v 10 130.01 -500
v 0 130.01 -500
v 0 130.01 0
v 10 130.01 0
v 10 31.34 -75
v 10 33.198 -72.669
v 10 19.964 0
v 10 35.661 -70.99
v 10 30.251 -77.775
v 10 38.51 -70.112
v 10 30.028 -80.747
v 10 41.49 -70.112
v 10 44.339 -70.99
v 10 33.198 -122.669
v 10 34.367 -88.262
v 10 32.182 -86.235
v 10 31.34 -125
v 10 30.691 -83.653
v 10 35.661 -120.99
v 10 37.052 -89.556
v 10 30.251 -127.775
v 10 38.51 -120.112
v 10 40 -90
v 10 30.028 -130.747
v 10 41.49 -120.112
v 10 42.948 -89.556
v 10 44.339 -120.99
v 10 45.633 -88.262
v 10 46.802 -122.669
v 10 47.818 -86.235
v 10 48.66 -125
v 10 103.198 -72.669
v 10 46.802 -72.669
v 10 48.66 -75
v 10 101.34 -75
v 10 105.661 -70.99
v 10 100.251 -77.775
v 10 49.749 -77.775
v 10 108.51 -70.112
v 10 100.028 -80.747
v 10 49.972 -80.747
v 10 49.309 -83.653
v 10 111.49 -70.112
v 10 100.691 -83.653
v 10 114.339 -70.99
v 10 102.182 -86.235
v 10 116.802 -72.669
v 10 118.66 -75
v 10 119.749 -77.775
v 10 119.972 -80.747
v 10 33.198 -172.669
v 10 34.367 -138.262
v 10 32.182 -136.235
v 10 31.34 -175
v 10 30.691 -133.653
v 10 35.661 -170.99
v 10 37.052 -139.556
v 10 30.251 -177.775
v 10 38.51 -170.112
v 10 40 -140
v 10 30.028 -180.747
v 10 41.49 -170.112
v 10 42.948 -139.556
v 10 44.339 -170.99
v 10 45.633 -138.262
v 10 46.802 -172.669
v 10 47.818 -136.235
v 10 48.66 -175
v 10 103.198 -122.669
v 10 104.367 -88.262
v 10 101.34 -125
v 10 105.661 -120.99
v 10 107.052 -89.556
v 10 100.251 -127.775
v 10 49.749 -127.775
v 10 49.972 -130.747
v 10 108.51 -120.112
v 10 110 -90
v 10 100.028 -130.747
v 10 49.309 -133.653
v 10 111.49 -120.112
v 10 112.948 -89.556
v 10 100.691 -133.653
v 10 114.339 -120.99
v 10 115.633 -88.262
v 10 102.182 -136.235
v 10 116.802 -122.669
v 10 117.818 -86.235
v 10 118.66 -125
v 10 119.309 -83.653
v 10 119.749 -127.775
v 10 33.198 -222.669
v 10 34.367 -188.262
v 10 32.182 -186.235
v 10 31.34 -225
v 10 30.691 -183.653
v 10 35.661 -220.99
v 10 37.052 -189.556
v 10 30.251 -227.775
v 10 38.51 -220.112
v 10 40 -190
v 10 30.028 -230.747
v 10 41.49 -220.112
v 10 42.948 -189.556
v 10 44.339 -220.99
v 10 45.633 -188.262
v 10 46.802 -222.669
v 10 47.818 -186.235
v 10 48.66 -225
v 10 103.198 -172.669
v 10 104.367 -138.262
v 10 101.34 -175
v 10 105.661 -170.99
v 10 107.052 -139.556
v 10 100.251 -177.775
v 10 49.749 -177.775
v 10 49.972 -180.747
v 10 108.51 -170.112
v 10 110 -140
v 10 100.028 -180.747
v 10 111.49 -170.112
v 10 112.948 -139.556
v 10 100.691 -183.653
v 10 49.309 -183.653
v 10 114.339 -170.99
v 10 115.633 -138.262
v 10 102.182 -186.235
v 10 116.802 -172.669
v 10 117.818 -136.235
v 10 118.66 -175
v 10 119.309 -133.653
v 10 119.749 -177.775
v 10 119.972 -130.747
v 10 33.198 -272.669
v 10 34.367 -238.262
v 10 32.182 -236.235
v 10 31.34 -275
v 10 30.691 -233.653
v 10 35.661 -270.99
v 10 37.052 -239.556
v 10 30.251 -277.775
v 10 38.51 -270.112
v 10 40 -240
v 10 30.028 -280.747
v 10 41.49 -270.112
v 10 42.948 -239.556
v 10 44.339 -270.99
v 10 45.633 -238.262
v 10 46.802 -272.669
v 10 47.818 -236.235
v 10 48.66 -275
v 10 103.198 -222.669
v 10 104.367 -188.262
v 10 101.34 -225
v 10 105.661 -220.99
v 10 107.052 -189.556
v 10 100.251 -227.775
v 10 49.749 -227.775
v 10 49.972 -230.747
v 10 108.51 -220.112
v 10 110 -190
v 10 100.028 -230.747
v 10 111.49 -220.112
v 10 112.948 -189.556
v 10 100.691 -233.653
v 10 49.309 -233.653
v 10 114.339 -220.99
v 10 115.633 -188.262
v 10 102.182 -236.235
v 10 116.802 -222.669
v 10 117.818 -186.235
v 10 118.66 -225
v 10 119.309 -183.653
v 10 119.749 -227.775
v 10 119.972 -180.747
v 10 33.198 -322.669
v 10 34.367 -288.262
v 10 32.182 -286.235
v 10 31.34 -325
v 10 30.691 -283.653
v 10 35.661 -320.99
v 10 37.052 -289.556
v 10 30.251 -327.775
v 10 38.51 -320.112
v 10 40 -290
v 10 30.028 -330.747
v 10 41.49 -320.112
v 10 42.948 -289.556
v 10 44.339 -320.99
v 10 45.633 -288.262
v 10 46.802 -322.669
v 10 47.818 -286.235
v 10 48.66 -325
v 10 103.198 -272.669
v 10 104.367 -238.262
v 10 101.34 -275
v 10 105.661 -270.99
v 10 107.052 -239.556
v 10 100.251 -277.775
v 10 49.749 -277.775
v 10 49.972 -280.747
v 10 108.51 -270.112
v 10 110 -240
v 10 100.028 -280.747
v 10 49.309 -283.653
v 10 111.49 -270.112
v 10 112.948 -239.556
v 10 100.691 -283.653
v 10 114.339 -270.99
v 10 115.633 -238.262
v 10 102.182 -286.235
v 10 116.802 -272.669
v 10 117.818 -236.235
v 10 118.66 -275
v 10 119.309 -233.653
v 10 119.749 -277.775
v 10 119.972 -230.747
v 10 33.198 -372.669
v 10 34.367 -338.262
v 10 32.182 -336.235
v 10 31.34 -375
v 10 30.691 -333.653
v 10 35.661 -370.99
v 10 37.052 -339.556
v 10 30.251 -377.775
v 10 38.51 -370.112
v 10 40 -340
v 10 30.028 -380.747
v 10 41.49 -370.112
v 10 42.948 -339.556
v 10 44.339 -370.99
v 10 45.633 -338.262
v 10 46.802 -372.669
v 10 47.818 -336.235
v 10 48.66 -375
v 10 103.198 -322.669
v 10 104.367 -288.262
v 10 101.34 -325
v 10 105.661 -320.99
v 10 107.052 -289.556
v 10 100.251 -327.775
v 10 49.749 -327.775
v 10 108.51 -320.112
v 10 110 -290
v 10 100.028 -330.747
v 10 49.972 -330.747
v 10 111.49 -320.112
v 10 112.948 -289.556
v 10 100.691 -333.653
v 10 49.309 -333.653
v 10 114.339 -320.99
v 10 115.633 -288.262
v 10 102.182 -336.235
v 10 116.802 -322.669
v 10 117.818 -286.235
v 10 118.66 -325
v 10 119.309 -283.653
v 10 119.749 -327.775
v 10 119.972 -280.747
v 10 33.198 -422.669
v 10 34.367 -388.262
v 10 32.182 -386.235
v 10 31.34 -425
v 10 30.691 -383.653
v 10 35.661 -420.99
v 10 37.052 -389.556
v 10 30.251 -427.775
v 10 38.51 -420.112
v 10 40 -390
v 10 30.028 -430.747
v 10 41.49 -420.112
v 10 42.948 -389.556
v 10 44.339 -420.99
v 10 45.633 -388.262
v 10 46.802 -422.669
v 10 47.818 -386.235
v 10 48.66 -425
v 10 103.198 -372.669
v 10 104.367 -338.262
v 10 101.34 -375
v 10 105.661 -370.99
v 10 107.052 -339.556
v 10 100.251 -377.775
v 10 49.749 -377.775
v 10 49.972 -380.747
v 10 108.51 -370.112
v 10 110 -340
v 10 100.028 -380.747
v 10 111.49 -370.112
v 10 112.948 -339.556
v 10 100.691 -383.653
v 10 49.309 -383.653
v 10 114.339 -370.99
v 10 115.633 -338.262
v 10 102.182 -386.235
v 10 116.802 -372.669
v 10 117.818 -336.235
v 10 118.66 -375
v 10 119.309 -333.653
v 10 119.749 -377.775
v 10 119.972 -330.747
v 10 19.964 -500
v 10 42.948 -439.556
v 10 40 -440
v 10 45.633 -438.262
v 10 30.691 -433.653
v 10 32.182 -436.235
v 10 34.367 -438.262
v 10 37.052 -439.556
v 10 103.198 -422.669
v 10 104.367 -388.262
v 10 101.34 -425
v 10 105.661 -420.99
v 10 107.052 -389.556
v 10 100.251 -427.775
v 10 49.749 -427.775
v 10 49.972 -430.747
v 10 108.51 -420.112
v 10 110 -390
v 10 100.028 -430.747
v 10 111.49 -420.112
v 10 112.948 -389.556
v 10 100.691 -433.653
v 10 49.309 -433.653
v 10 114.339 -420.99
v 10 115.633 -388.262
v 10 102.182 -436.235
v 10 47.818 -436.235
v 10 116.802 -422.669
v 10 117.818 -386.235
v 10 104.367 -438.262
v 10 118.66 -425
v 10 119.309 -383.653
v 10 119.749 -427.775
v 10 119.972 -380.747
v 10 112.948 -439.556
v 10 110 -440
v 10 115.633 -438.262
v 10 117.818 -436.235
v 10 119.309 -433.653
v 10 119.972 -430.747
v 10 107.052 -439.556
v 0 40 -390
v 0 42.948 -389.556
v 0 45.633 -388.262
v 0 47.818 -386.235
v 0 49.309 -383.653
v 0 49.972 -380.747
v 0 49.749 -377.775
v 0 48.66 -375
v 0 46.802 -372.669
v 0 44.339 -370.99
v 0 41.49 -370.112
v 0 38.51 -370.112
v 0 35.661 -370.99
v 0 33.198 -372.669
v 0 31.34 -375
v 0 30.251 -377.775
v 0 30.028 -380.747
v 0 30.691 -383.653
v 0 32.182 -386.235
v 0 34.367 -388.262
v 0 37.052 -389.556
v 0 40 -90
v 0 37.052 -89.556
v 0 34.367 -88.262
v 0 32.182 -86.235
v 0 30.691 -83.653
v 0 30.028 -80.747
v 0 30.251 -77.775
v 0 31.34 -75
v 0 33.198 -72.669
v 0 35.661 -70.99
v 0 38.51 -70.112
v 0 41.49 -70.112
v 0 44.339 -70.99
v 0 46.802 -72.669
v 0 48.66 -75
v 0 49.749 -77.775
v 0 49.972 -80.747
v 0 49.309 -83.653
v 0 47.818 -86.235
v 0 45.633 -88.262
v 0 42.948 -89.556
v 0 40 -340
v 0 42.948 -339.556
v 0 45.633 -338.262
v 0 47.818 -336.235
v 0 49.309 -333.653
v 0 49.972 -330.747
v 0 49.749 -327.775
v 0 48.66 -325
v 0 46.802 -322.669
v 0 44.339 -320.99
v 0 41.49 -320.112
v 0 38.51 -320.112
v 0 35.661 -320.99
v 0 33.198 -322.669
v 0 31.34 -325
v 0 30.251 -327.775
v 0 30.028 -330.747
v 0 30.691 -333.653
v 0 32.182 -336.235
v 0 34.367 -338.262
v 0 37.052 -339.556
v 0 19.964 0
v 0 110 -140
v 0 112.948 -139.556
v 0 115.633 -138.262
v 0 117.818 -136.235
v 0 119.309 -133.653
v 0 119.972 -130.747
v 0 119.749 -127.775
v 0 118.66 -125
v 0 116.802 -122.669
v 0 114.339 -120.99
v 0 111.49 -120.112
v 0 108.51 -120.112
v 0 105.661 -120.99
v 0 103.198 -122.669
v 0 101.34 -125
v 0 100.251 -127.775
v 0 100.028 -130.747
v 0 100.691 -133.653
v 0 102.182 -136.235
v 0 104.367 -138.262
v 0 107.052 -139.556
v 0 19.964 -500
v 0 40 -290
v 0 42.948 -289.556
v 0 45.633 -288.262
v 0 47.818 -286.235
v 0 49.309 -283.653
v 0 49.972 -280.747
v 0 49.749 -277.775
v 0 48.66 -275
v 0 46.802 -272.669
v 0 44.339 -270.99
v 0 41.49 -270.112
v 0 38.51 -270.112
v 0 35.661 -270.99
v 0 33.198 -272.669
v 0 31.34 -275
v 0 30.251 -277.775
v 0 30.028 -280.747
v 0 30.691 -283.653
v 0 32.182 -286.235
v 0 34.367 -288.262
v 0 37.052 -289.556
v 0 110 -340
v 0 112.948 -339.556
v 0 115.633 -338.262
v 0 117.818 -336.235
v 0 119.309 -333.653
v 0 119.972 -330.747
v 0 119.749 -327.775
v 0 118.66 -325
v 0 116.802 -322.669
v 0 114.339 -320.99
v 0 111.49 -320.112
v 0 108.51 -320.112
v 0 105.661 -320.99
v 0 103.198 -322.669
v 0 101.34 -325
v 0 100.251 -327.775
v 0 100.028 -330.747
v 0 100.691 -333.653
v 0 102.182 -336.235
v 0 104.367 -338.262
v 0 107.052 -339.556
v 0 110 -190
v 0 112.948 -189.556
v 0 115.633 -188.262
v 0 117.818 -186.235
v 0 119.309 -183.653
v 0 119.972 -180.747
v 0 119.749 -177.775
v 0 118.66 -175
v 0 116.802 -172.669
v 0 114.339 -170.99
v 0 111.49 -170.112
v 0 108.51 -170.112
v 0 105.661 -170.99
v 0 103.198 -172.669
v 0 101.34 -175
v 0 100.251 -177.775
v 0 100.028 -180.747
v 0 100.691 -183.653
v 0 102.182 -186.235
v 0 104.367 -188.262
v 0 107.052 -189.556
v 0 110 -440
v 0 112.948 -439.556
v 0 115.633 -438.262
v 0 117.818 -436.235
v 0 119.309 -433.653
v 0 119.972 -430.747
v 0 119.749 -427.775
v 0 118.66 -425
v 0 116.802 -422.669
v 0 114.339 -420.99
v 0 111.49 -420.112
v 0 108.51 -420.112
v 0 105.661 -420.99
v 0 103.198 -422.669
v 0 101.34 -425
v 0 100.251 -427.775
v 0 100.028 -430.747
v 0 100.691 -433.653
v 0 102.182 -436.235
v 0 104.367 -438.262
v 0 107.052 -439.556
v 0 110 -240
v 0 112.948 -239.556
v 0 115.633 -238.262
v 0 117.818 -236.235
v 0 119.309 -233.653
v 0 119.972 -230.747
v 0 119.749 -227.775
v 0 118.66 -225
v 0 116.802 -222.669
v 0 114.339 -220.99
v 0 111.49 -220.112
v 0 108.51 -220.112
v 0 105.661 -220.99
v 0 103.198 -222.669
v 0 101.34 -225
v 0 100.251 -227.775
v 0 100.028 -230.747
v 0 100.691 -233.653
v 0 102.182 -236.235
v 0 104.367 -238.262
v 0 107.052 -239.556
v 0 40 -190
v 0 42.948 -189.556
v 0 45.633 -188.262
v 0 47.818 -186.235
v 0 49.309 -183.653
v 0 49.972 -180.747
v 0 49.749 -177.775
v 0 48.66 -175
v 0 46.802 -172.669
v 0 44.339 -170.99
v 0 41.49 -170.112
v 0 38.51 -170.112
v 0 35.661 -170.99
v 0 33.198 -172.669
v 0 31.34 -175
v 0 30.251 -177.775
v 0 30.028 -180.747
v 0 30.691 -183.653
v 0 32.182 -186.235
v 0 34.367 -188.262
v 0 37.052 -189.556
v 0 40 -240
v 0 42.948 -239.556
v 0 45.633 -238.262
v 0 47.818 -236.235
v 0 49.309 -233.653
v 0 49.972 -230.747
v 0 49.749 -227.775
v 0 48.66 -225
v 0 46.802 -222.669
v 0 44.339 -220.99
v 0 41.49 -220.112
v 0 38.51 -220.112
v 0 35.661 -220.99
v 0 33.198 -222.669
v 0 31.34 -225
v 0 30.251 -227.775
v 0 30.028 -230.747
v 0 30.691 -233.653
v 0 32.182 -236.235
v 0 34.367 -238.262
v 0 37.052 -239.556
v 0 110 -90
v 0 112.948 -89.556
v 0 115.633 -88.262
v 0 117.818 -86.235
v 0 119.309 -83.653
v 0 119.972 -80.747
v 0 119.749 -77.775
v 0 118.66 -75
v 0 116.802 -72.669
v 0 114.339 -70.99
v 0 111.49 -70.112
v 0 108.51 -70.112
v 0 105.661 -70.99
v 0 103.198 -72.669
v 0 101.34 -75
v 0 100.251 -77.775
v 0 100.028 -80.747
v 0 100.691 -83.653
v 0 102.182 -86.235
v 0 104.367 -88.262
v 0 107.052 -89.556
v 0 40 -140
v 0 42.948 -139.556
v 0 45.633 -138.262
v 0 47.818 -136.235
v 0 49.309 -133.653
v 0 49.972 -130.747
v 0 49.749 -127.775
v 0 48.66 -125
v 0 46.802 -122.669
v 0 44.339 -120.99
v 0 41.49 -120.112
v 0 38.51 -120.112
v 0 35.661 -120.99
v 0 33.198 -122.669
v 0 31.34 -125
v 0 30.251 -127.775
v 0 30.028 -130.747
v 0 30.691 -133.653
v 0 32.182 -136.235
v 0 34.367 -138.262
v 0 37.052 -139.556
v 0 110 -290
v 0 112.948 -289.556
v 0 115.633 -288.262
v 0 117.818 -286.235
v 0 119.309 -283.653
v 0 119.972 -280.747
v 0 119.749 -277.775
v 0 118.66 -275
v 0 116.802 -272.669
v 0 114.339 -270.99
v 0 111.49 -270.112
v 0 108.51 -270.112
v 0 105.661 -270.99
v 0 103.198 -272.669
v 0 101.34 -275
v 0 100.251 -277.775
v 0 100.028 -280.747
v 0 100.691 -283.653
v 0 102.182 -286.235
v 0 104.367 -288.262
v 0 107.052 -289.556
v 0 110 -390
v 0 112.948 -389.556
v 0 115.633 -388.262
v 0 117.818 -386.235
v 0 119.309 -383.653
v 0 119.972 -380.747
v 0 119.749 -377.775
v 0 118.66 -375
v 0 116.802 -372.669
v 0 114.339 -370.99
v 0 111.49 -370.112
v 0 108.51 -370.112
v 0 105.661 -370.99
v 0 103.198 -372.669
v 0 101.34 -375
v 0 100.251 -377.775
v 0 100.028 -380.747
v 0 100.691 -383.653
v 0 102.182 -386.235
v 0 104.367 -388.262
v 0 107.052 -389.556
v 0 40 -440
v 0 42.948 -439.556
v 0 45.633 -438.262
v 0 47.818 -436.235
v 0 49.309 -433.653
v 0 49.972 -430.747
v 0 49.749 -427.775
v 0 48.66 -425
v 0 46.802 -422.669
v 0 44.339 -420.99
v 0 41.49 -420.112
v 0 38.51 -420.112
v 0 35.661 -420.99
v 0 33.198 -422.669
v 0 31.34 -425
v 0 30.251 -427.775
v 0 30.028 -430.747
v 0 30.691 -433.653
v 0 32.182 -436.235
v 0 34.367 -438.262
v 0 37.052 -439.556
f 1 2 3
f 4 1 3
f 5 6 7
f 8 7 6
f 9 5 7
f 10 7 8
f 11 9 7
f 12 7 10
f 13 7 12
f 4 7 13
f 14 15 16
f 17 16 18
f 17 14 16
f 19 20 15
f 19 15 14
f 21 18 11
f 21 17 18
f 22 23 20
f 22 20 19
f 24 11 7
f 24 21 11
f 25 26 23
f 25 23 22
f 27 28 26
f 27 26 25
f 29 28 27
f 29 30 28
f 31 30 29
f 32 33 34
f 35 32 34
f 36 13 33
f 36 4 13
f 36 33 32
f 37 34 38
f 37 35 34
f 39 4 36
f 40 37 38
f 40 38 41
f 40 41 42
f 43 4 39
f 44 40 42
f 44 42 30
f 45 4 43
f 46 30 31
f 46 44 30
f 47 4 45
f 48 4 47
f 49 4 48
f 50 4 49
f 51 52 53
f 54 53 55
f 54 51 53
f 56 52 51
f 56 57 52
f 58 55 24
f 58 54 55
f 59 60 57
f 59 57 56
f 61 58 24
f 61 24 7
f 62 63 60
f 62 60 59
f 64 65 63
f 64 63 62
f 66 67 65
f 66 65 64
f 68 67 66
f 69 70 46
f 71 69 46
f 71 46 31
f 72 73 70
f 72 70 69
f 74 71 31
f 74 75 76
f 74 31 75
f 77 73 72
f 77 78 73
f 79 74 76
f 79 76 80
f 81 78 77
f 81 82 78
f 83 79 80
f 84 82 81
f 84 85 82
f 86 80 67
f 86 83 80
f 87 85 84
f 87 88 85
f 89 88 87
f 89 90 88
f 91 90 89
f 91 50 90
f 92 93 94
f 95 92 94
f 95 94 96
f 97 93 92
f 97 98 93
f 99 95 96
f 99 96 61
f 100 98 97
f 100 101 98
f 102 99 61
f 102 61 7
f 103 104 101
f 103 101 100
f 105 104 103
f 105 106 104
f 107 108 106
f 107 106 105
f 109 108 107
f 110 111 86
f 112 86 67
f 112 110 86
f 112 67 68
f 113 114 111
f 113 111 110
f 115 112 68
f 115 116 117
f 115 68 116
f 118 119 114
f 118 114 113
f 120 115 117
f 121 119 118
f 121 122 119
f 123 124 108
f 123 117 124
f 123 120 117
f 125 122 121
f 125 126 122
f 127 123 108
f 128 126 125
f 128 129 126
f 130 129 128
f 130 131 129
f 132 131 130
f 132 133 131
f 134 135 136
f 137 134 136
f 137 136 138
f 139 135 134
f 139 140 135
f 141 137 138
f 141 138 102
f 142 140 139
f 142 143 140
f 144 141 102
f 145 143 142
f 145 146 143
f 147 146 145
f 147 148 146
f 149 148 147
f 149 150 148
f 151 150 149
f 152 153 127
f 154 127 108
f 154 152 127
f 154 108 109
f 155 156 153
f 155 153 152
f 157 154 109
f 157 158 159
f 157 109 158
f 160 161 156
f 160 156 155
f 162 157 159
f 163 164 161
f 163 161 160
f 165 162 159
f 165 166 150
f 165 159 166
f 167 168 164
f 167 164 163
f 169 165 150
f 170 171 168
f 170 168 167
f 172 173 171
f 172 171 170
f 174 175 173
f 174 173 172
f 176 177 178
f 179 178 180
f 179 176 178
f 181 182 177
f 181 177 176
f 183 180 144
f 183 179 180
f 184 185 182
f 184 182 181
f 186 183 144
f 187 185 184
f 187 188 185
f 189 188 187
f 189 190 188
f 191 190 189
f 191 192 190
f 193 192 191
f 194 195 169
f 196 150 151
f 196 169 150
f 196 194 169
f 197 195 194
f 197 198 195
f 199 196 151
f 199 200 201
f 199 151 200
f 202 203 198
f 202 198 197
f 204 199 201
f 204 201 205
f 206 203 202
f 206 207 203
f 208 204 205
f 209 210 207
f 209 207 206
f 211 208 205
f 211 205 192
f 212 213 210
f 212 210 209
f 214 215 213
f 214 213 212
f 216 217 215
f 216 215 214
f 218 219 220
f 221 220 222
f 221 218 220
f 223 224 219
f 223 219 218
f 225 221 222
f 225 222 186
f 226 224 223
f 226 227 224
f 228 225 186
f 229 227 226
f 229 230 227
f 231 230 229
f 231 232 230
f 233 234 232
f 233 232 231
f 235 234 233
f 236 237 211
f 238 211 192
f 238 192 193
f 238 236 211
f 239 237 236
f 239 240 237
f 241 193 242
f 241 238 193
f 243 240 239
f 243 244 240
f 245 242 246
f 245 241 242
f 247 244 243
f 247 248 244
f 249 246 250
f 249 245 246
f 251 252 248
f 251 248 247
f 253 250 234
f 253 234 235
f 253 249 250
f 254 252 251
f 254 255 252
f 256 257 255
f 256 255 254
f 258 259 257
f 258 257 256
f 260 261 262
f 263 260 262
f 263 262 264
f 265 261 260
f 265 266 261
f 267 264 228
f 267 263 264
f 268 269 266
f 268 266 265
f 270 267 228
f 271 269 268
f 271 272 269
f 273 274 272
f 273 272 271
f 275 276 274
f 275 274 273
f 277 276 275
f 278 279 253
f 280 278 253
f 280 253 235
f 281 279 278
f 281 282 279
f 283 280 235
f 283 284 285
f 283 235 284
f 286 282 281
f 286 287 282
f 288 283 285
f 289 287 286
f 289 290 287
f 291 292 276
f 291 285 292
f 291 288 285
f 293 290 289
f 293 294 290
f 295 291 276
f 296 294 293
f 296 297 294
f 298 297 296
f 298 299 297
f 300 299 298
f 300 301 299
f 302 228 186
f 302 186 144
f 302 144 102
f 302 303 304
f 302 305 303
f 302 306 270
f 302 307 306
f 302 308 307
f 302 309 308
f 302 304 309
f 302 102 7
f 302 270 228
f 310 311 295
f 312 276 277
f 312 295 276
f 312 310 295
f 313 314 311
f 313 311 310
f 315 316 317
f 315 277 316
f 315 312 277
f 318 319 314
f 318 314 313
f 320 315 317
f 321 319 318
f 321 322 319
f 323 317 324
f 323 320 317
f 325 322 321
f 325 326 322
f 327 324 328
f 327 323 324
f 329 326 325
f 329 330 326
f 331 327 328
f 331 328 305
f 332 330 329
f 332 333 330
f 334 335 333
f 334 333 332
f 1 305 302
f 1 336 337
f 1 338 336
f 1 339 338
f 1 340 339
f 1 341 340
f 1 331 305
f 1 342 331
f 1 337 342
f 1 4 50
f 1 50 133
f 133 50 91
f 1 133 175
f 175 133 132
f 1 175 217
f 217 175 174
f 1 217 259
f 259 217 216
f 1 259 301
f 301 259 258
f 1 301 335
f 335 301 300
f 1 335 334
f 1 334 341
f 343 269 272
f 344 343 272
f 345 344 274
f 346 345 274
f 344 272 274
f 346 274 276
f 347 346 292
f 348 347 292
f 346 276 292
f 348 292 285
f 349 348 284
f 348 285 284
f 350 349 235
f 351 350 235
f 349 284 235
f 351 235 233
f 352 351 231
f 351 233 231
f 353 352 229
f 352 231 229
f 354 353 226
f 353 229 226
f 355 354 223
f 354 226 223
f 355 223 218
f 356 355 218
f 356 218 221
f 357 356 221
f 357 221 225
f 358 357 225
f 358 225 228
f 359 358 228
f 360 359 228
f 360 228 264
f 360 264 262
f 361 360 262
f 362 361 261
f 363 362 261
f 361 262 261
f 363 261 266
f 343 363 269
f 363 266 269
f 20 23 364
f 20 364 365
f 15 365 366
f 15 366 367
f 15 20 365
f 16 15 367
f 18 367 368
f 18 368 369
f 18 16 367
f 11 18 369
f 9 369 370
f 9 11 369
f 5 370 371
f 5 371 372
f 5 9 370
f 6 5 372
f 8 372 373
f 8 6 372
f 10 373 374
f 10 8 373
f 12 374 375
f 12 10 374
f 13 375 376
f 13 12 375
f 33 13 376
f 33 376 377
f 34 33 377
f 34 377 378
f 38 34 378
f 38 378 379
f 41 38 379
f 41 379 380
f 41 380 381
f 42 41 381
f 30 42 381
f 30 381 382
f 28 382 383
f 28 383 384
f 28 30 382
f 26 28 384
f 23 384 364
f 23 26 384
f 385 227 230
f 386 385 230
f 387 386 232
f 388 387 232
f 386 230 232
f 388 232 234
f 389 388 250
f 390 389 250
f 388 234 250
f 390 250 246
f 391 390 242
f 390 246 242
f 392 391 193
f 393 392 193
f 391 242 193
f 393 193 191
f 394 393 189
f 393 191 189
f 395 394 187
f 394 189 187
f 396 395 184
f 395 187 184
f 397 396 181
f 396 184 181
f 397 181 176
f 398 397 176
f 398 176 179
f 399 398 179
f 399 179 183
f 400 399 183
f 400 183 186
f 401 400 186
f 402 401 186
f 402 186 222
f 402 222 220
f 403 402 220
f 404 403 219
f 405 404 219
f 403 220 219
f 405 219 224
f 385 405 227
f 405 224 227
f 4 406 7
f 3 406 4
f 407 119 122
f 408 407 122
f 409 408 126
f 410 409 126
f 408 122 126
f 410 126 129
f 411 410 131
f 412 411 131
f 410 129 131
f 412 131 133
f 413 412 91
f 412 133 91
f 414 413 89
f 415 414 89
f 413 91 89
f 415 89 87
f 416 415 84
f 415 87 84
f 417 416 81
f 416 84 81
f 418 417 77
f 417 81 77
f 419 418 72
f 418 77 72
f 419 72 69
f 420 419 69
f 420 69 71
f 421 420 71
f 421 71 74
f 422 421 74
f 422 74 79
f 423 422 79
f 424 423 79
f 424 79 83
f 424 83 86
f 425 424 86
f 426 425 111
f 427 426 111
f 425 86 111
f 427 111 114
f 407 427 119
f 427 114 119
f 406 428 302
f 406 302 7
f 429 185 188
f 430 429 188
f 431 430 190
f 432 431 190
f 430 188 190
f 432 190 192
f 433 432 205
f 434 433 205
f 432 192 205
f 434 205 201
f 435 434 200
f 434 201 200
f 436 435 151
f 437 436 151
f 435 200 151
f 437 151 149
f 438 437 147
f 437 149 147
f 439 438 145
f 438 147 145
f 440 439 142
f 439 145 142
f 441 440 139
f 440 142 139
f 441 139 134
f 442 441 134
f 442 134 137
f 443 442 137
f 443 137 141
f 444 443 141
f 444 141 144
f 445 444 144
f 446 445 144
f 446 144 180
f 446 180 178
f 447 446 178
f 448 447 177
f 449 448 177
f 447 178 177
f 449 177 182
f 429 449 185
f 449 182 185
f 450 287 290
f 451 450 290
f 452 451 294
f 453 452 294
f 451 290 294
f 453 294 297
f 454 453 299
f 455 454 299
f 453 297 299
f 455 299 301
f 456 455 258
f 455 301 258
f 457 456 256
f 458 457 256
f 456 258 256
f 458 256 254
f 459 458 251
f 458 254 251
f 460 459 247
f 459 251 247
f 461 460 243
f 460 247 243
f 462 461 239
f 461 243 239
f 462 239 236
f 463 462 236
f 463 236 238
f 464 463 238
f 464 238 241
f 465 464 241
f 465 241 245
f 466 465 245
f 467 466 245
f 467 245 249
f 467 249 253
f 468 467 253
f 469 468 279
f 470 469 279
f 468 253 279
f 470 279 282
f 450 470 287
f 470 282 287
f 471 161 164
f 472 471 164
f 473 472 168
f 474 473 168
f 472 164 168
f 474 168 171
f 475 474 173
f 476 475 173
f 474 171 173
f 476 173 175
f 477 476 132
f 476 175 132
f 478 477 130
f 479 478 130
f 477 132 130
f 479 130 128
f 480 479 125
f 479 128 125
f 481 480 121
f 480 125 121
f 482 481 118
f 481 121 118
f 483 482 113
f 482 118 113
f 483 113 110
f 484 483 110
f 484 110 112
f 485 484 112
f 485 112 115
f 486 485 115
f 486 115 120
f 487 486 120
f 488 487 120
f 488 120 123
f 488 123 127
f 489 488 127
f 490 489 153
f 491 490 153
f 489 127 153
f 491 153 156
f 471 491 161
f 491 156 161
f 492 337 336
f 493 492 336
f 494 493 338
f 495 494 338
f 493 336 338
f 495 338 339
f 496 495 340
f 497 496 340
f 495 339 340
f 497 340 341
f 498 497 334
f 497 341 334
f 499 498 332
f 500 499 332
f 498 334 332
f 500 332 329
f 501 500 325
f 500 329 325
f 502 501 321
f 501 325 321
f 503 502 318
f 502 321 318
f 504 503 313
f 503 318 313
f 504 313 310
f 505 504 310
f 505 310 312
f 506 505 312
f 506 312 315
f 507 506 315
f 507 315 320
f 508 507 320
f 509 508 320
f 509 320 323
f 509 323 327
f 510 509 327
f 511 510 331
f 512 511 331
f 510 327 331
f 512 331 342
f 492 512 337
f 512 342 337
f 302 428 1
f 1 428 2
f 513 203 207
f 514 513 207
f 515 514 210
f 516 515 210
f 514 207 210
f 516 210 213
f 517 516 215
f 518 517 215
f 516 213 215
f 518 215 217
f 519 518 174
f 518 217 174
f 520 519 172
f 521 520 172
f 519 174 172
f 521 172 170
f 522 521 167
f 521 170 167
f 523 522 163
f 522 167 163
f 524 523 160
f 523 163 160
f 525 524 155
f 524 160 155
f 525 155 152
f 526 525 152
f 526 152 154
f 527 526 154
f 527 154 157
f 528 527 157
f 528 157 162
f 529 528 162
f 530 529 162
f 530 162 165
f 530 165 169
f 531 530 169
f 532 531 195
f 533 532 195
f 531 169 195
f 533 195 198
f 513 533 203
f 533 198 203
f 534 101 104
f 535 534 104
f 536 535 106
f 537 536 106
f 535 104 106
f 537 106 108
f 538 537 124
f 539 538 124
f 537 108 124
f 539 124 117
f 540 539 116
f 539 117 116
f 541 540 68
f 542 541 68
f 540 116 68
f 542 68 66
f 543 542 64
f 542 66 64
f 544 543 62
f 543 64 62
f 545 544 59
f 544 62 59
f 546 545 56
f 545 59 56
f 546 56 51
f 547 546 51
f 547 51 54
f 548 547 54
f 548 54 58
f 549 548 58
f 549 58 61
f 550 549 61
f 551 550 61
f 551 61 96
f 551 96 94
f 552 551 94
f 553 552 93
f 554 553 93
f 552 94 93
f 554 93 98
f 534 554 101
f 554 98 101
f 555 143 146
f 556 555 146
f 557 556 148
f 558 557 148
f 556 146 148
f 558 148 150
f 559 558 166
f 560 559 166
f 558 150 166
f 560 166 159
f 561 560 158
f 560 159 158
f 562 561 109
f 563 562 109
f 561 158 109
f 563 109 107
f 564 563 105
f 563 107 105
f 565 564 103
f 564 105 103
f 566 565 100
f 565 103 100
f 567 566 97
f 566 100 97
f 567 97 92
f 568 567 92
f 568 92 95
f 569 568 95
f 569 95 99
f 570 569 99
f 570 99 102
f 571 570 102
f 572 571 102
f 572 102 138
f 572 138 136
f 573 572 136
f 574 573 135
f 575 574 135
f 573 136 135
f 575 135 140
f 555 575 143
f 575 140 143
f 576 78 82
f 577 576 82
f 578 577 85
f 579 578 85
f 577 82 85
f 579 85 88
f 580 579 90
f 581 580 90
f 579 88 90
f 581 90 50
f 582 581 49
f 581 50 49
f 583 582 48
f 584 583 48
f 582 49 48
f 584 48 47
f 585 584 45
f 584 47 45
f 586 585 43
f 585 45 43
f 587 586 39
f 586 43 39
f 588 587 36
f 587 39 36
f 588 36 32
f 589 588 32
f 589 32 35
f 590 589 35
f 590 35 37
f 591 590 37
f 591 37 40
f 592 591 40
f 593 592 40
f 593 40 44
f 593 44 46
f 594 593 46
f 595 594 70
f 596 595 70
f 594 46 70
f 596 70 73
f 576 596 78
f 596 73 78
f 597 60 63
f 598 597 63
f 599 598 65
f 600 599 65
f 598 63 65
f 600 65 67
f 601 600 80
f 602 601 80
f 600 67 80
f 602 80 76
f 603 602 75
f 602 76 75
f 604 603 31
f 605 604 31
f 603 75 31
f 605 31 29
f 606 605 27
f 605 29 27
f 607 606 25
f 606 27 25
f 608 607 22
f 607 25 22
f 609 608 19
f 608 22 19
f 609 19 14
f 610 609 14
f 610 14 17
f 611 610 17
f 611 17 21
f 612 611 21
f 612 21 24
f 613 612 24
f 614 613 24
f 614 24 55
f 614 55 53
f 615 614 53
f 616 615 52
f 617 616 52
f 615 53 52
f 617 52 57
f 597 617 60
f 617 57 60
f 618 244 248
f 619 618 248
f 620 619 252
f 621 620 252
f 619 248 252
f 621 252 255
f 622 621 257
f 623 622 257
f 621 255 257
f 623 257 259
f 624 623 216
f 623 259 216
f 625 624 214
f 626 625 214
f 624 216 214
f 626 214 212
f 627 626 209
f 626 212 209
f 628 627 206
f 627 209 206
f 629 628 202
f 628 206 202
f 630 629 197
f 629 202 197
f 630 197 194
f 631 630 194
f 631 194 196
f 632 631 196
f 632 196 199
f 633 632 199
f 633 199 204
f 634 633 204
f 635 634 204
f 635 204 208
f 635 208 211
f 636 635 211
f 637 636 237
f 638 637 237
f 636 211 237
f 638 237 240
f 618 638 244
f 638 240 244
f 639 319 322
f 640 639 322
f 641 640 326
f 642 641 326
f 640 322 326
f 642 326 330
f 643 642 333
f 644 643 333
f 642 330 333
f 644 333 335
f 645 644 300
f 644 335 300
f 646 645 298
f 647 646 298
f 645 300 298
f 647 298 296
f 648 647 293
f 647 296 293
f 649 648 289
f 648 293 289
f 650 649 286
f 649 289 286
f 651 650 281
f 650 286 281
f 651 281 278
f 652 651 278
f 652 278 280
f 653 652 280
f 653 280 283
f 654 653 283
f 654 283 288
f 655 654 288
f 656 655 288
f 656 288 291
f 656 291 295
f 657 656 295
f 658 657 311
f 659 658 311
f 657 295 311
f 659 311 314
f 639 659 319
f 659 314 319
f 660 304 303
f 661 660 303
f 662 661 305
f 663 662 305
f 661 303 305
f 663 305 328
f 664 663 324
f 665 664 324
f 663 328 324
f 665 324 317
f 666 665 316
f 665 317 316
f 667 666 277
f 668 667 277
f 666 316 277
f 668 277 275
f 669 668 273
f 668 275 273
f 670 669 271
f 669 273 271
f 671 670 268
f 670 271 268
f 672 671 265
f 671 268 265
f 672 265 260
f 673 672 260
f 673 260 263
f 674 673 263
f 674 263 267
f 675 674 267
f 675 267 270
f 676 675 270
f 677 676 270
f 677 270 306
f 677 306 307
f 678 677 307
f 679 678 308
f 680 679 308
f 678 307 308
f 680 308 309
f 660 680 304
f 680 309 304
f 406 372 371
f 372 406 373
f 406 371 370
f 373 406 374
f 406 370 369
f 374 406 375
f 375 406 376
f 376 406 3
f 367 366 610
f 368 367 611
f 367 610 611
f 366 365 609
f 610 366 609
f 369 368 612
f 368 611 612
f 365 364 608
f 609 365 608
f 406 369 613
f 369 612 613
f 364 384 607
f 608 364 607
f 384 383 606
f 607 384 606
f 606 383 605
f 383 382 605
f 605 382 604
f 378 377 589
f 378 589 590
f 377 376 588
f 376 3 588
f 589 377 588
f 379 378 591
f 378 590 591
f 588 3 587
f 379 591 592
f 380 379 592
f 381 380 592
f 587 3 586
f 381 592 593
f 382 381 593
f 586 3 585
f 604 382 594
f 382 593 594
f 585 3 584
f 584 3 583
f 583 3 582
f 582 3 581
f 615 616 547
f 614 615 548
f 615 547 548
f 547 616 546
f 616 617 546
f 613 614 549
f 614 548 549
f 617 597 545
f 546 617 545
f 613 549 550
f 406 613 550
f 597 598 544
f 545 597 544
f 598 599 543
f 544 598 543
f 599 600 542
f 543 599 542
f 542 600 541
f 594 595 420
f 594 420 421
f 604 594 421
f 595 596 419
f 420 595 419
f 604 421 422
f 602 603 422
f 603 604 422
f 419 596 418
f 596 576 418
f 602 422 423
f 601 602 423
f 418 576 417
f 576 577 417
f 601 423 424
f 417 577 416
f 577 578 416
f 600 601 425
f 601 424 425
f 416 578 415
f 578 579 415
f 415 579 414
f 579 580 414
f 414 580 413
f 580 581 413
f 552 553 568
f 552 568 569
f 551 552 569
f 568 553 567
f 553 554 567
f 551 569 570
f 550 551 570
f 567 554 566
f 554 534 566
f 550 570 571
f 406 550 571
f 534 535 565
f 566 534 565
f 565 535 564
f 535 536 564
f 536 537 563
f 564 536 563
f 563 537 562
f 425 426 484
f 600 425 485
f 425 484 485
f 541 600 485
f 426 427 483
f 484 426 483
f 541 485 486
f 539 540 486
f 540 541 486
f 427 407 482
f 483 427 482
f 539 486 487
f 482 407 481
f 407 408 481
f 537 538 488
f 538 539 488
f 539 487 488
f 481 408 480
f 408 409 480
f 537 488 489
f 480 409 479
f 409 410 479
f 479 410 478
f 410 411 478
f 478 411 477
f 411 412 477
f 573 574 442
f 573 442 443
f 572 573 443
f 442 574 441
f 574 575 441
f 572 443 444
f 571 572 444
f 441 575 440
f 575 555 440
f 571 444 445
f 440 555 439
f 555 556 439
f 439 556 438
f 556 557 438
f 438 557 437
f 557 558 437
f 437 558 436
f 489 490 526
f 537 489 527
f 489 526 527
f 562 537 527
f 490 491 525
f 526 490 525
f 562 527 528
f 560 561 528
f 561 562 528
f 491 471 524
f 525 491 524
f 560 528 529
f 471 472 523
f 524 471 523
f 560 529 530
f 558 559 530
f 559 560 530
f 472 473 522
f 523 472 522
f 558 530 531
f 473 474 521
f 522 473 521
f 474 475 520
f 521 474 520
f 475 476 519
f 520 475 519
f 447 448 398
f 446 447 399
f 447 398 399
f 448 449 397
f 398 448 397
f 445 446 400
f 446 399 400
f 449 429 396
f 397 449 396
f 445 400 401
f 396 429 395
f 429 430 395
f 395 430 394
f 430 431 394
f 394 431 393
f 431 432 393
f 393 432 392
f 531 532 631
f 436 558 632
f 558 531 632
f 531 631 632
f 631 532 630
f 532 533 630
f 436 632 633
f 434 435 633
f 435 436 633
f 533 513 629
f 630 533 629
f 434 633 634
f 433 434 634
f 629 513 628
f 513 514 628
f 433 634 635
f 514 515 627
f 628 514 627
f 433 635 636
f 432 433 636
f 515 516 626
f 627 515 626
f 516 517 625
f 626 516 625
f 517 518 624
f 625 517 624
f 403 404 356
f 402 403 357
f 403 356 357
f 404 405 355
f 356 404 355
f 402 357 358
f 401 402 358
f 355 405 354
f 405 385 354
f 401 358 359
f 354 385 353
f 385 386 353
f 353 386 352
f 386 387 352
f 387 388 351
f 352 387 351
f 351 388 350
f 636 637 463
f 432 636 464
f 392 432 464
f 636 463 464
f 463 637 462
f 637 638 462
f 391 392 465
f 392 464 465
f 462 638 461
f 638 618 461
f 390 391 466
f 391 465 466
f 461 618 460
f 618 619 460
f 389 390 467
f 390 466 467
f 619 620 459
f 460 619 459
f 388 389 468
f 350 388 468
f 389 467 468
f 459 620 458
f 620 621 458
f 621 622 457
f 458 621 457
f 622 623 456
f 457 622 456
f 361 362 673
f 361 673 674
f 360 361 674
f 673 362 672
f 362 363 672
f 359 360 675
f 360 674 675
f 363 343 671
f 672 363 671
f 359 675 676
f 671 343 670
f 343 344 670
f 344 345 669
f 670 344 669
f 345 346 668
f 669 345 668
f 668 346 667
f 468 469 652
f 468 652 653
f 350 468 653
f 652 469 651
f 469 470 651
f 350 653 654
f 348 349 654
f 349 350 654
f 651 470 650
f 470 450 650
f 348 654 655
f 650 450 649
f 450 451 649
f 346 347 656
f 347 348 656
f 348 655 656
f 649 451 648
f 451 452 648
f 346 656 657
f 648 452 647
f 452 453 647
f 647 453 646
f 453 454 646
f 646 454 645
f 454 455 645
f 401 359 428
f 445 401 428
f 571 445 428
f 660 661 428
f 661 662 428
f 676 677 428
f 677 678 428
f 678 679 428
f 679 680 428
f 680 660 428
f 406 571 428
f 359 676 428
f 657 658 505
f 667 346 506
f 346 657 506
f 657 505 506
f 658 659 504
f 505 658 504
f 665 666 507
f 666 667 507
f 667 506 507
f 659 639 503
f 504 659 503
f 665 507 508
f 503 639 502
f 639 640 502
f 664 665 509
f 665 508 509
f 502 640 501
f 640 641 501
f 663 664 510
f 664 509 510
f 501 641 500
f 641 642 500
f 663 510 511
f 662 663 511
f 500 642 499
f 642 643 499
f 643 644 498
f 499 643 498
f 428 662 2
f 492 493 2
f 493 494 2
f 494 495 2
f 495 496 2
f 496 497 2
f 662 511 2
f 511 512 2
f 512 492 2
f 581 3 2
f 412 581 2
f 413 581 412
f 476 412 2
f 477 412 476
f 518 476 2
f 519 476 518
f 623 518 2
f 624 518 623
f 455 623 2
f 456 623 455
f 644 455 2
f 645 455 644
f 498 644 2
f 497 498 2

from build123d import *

# Parameters (mm, degrees)
SKETCH2_W               = 500
SKETCH2_H               = 150
BOSS_EXTRUDE1_DEPTH     = 10
SKETCH3_R               = 10
CUT_EXTRUDE1_DEPTH      = 10
LPATTERN1_COUNT         = 8
LPATTERN1_PITCH         = 50
MIRROR1_COPY_1_SKETCH_R = 10
MIRROR1_COPY_1_DEPTH    = 10
MIRROR1_COPY_2_SKETCH_R = 10
MIRROR1_COPY_2_DEPTH    = 10
MIRROR1_COPY_3_SKETCH_R = 10
MIRROR1_COPY_3_DEPTH    = 10
MIRROR1_COPY_4_SKETCH_R = 10
MIRROR1_COPY_4_DEPTH    = 10
MIRROR1_COPY_5_SKETCH_R = 10
MIRROR1_COPY_5_DEPTH    = 10
MIRROR1_COPY_6_SKETCH_R = 10
MIRROR1_COPY_6_DEPTH    = 10
MIRROR1_COPY_7_SKETCH_R = 10
MIRROR1_COPY_7_DEPTH    = 10
SKETCH4_W               = 500
SKETCH4_H               = 19.989679831
SKETCH4_H_2             = 19.964210349
CUT_EXTRUDE2_DEPTH      = 10


with BuildPart() as part:
    # Sketch2 → Boss-Extrude1 (new body)
    with BuildSketch(Plane(origin=(0, 0, 0), x_dir=(0, 0, -1), z_dir=(1, 0, 0))):
        with Locations((250, 75)):
            Rectangle(SKETCH2_W, SKETCH2_H)
    extrude(amount=BOSS_EXTRUDE1_DEPTH)

    # Sketch3 → Cut-Extrude1 (cut)
    with BuildSketch(Plane(origin=(10, 0, 0), x_dir=(0, 0, -1), z_dir=(1, 0, 0))):
        with Locations((80, 110)):
            Circle(SKETCH3_R)
    cut_extrude1 = extrude(amount=-CUT_EXTRUDE1_DEPTH, mode=Mode.SUBTRACT)

    # LPattern1: Cut-Extrude1 ×8
    with Locations(*[(0, 0, -i * LPATTERN1_PITCH) for i in range(1, LPATTERN1_COUNT)]):
        add(cut_extrude1, mode=Mode.SUBTRACT)

    # Mirror1: Cut-Extrude1 across plane
    add(cut_extrude1.mirror(Plane.ZX.offset(75)), mode=Mode.SUBTRACT)

    # Mirror1 copy 1 sketch → Mirror1 copy 1 (cut)
    with BuildSketch(Plane(origin=(10, 150, -50), x_dir=(0, 0, -1), z_dir=(1, 0, 0))):
        with Locations((80, -110)):
            Circle(MIRROR1_COPY_1_SKETCH_R)
    extrude(amount=-MIRROR1_COPY_1_DEPTH, mode=Mode.SUBTRACT)

    # Mirror1 copy 2 sketch → Mirror1 copy 2 (cut)
    with BuildSketch(Plane(origin=(10, 150, -100), x_dir=(0, 0, -1), z_dir=(1, 0, 0))):
        with Locations((80, -110)):
            Circle(MIRROR1_COPY_2_SKETCH_R)
    extrude(amount=-MIRROR1_COPY_2_DEPTH, mode=Mode.SUBTRACT)

    # Mirror1 copy 3 sketch → Mirror1 copy 3 (cut)
    with BuildSketch(Plane(origin=(10, 150, -150), x_dir=(0, 0, -1), z_dir=(1, 0, 0))):
        with Locations((80, -110)):
            Circle(MIRROR1_COPY_3_SKETCH_R)
    extrude(amount=-MIRROR1_COPY_3_DEPTH, mode=Mode.SUBTRACT)

    # Mirror1 copy 4 sketch → Mirror1 copy 4 (cut)
    with BuildSketch(Plane(origin=(10, 150, -200), x_dir=(0, 0, -1), z_dir=(1, 0, 0))):
        with Locations((80, -110)):
            Circle(MIRROR1_COPY_4_SKETCH_R)
    extrude(amount=-MIRROR1_COPY_4_DEPTH, mode=Mode.SUBTRACT)

    # Mirror1 copy 5 sketch → Mirror1 copy 5 (cut)
    with BuildSketch(Plane(origin=(10, 150, -250), x_dir=(0, 0, -1), z_dir=(1, 0, 0))):
        with Locations((80, -110)):
            Circle(MIRROR1_COPY_5_SKETCH_R)
    extrude(amount=-MIRROR1_COPY_5_DEPTH, mode=Mode.SUBTRACT)

    # Mirror1 copy 6 sketch → Mirror1 copy 6 (cut)
    with BuildSketch(Plane(origin=(10, 150, -300), x_dir=(0, 0, -1), z_dir=(1, 0, 0))):
        with Locations((80, -110)):
            Circle(MIRROR1_COPY_6_SKETCH_R)
    extrude(amount=-MIRROR1_COPY_6_DEPTH, mode=Mode.SUBTRACT)

    # Mirror1 copy 7 sketch → Mirror1 copy 7 (cut)
    with BuildSketch(Plane(origin=(10, 150, -350), x_dir=(0, 0, -1), z_dir=(1, 0, 0))):
        with Locations((80, -110)):
            Circle(MIRROR1_COPY_7_SKETCH_R)
    extrude(amount=-MIRROR1_COPY_7_DEPTH, mode=Mode.SUBTRACT)

    # Sketch4 → Cut-Extrude2 (cut)
    with BuildSketch(Plane.ZY):
        with Locations((-250, 140.005160085)):
            Rectangle(SKETCH4_W, SKETCH4_H)
        with Locations((-250, 9.982105175)):
            Rectangle(SKETCH4_W, SKETCH4_H_2)
    extrude(amount=-CUT_EXTRUDE2_DEPTH, mode=Mode.SUBTRACT)


solid = part.part
